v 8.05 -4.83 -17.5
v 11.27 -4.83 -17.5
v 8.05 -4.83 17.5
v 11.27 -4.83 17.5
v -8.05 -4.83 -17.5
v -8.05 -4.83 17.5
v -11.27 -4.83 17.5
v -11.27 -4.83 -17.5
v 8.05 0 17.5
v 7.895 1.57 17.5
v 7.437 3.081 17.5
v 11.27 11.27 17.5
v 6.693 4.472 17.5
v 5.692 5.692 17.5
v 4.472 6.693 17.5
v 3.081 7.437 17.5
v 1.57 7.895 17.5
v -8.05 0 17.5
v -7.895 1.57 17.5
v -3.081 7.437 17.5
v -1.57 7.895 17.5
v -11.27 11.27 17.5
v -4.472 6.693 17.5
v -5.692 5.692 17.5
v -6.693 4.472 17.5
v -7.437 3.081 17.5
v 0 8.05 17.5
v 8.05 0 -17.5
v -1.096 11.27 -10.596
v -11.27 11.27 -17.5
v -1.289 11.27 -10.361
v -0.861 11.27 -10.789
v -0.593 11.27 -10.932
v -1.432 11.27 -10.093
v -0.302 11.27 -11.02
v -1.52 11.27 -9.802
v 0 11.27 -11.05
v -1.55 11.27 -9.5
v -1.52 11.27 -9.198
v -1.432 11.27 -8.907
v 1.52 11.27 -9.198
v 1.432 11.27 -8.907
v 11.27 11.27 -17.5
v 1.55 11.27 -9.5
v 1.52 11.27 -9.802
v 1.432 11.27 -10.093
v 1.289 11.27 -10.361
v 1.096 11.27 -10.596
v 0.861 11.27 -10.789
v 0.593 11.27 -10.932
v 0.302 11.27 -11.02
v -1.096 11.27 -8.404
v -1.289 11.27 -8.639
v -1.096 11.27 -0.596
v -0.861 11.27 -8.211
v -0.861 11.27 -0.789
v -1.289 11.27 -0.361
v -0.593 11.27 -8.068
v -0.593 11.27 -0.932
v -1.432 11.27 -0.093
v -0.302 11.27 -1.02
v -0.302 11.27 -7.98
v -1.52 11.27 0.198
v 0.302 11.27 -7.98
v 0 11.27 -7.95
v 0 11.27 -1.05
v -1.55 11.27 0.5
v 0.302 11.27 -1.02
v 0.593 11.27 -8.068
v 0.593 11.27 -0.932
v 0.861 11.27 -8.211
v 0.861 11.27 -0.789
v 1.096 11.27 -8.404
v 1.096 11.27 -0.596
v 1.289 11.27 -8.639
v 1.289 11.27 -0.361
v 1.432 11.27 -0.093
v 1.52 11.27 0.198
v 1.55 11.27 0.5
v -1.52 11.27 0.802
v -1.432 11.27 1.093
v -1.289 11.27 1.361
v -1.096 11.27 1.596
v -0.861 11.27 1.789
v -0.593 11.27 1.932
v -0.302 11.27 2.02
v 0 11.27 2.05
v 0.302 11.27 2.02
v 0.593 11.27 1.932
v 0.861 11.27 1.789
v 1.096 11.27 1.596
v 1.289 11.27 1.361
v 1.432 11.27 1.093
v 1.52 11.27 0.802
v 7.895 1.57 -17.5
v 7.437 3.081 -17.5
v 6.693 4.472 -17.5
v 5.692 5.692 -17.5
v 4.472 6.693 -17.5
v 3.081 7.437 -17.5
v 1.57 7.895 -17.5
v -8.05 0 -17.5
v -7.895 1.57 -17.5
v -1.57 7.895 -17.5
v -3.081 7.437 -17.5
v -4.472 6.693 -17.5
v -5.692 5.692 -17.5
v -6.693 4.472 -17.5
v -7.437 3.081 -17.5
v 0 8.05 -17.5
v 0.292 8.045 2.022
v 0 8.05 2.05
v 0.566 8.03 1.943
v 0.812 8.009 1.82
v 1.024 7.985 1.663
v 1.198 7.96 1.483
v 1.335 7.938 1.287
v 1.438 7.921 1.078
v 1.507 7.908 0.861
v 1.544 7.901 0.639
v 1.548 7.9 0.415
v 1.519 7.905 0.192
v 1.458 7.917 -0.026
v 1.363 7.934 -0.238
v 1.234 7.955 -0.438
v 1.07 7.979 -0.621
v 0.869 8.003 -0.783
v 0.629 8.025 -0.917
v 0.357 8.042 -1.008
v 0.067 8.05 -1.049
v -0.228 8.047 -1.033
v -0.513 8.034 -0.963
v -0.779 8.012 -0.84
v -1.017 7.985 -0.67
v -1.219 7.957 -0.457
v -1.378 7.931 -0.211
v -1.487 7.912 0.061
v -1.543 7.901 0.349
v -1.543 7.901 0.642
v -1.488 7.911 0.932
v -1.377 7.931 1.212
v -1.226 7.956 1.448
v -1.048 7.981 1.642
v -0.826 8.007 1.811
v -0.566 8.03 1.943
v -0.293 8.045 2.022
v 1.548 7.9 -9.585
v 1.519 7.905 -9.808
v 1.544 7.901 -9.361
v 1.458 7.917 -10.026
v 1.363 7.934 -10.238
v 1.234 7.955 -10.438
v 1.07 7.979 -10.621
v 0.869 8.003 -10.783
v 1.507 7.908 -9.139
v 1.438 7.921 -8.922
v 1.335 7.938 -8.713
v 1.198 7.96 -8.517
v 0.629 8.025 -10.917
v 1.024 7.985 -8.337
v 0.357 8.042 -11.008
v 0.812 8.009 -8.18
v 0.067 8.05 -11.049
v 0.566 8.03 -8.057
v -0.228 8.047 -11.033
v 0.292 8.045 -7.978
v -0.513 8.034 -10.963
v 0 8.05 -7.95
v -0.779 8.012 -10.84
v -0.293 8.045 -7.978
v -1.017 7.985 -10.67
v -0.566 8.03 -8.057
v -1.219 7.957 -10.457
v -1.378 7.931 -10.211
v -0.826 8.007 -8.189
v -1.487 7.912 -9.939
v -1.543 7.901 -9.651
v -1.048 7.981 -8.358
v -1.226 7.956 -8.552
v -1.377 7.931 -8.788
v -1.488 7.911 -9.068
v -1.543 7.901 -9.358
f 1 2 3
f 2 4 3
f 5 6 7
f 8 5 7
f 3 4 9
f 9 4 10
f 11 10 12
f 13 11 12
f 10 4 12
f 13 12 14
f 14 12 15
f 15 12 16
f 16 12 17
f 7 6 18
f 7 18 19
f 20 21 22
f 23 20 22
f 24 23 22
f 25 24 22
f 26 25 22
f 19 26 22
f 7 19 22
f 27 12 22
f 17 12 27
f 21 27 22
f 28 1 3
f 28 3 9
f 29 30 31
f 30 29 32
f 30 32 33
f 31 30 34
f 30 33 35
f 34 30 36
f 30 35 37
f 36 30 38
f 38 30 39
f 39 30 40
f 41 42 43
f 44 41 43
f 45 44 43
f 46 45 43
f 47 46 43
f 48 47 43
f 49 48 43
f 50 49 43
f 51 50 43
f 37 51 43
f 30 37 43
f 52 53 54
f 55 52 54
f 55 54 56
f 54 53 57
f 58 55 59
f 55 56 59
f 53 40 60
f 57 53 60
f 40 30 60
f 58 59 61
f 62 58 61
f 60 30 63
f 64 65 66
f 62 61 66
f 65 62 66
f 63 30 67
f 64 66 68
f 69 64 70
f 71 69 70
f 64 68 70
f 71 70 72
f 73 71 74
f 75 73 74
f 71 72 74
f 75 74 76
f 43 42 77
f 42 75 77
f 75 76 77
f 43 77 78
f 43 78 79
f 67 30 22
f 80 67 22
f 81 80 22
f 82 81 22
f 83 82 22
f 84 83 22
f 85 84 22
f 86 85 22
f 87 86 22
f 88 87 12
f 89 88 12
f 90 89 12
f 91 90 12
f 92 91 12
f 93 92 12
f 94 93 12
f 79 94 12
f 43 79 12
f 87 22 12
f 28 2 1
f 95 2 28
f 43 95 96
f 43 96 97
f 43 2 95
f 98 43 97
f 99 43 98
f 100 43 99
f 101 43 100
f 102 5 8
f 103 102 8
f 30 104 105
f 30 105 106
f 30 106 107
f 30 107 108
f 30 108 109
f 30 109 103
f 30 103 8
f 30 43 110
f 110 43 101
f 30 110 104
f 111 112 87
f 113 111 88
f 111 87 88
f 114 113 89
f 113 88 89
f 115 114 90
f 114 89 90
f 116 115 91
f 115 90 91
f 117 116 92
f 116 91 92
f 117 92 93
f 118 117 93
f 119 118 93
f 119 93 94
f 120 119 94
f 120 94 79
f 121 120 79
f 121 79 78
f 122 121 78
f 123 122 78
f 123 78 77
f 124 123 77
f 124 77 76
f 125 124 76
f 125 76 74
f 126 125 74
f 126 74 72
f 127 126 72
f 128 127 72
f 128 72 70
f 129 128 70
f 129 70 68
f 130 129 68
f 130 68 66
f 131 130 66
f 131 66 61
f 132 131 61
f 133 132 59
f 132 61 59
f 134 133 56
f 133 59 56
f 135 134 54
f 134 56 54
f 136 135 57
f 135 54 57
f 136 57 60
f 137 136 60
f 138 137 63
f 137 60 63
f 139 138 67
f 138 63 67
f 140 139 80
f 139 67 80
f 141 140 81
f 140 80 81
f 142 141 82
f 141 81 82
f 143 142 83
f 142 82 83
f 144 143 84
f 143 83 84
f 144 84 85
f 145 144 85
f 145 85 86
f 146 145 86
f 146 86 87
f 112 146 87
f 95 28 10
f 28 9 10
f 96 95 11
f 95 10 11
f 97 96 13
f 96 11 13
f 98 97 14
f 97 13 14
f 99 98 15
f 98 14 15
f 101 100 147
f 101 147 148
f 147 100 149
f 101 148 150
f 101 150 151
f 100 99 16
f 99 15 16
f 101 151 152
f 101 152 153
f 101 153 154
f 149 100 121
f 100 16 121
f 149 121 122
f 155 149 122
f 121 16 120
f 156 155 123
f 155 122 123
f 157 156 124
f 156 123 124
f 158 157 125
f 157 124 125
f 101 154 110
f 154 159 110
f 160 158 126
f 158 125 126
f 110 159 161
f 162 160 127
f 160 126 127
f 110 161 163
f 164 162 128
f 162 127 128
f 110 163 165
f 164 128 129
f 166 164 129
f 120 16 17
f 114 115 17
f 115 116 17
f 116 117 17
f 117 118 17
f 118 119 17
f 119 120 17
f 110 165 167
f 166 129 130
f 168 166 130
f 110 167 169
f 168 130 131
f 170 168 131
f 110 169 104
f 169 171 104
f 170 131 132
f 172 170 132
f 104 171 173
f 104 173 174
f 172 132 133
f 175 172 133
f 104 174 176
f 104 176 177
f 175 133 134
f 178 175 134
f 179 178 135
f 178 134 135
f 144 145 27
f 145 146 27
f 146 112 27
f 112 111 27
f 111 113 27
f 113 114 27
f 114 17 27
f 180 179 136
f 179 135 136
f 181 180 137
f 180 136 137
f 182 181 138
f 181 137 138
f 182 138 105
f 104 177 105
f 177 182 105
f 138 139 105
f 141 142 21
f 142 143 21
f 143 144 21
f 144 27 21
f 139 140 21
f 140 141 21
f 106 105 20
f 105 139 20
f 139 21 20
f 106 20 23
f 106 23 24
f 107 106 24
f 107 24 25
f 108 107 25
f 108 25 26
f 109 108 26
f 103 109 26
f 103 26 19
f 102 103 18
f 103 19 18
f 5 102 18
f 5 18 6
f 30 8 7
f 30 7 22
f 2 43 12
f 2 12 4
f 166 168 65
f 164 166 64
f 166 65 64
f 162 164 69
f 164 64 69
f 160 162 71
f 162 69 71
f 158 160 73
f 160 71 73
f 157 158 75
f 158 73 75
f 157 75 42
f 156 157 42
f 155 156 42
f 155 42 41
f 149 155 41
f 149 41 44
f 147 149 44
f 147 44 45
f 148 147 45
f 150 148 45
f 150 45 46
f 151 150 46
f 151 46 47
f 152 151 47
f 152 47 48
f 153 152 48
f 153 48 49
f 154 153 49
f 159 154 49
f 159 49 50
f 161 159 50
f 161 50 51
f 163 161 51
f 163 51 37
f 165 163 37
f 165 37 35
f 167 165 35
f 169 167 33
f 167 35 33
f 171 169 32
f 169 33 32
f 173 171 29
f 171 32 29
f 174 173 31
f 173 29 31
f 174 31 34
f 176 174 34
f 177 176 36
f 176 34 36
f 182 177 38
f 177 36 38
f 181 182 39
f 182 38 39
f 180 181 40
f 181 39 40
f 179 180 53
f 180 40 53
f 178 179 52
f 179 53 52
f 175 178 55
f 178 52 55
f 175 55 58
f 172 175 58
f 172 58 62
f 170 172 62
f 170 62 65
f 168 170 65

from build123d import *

# Parameters (mm, degrees)
BOSS_EXTRUDE1_DEPTH     = 17.5
CUT_EXTRUDE1_REACH      = 28.315
CUT_EXTRUDE1_END_RADIUS = 8.05
SKETCH2_R               = 1.55


with BuildPart() as part:
    # Sketch1 → Boss-Extrude1 (new, symmetric)
    with BuildSketch(Plane.XY):
        with BuildLine():
            Line((-11.27, 11.27), (11.27, 11.27))
            Line((11.27, 11.27), (11.27, -4.83))
            Line((11.27, -4.83), (8.05, -4.83))
            Line((8.05, -4.83), (8.05, 0))
            ThreePointArc((8.05, 0), (0, 8.05), (-8.05, 0))
            Line((-8.05, 0), (-8.05, -4.83))
            Line((-8.05, -4.83), (-11.27, -4.83))
            Line((-11.27, -4.83), (-11.27, 11.27))
        make_face()
    extrude(amount=BOSS_EXTRUDE1_DEPTH, both=True)

    # Cut-Extrude1: up to this cylinder (the profile starts outside it)
    cut_extrude1_end = Plane(origin=(0, 0, -4.5), z_dir=(0, 0, -1)) * Cylinder(CUT_EXTRUDE1_END_RADIUS, 83.73, mode=Mode.PRIVATE)
    # Sketch2 → Cut-Extrude1 (cut, up to the surface)
    with BuildSketch(Plane(origin=(0, 11.27, 0), x_dir=(1, 0, 0), z_dir=(0, 1, 0)), mode=Mode.PRIVATE) as cut_extrude1_sk1:
        with Locations(Location((0, 9.5, 0), (0, 0, 270))):
            Circle(SKETCH2_R)
    cut_extrude1_tool1 = extrude(cut_extrude1_sk1.sketch, amount=-CUT_EXTRUDE1_REACH, mode=Mode.PRIVATE) - cut_extrude1_end
    add(cut_extrude1_tool1.solids().sort_by_distance((0, 11.27, -9.5))[0], mode=Mode.SUBTRACT)
    # Sketch2 → Cut-Extrude1 (cut, up to the surface)
    with BuildSketch(Plane(origin=(0, 11.27, 0), x_dir=(1, 0, 0), z_dir=(0, 1, 0)), mode=Mode.PRIVATE) as cut_extrude1_sk2:
        with Locations(Location((0, -0.5, 0), (0, 0, 270))):
            Circle(SKETCH2_R)
    cut_extrude1_tool2 = extrude(cut_extrude1_sk2.sketch, amount=-CUT_EXTRUDE1_REACH, mode=Mode.PRIVATE) - cut_extrude1_end
    add(cut_extrude1_tool2.solids().sort_by_distance((0, 11.27, 0.5))[0], mode=Mode.SUBTRACT)


solid = part.part
